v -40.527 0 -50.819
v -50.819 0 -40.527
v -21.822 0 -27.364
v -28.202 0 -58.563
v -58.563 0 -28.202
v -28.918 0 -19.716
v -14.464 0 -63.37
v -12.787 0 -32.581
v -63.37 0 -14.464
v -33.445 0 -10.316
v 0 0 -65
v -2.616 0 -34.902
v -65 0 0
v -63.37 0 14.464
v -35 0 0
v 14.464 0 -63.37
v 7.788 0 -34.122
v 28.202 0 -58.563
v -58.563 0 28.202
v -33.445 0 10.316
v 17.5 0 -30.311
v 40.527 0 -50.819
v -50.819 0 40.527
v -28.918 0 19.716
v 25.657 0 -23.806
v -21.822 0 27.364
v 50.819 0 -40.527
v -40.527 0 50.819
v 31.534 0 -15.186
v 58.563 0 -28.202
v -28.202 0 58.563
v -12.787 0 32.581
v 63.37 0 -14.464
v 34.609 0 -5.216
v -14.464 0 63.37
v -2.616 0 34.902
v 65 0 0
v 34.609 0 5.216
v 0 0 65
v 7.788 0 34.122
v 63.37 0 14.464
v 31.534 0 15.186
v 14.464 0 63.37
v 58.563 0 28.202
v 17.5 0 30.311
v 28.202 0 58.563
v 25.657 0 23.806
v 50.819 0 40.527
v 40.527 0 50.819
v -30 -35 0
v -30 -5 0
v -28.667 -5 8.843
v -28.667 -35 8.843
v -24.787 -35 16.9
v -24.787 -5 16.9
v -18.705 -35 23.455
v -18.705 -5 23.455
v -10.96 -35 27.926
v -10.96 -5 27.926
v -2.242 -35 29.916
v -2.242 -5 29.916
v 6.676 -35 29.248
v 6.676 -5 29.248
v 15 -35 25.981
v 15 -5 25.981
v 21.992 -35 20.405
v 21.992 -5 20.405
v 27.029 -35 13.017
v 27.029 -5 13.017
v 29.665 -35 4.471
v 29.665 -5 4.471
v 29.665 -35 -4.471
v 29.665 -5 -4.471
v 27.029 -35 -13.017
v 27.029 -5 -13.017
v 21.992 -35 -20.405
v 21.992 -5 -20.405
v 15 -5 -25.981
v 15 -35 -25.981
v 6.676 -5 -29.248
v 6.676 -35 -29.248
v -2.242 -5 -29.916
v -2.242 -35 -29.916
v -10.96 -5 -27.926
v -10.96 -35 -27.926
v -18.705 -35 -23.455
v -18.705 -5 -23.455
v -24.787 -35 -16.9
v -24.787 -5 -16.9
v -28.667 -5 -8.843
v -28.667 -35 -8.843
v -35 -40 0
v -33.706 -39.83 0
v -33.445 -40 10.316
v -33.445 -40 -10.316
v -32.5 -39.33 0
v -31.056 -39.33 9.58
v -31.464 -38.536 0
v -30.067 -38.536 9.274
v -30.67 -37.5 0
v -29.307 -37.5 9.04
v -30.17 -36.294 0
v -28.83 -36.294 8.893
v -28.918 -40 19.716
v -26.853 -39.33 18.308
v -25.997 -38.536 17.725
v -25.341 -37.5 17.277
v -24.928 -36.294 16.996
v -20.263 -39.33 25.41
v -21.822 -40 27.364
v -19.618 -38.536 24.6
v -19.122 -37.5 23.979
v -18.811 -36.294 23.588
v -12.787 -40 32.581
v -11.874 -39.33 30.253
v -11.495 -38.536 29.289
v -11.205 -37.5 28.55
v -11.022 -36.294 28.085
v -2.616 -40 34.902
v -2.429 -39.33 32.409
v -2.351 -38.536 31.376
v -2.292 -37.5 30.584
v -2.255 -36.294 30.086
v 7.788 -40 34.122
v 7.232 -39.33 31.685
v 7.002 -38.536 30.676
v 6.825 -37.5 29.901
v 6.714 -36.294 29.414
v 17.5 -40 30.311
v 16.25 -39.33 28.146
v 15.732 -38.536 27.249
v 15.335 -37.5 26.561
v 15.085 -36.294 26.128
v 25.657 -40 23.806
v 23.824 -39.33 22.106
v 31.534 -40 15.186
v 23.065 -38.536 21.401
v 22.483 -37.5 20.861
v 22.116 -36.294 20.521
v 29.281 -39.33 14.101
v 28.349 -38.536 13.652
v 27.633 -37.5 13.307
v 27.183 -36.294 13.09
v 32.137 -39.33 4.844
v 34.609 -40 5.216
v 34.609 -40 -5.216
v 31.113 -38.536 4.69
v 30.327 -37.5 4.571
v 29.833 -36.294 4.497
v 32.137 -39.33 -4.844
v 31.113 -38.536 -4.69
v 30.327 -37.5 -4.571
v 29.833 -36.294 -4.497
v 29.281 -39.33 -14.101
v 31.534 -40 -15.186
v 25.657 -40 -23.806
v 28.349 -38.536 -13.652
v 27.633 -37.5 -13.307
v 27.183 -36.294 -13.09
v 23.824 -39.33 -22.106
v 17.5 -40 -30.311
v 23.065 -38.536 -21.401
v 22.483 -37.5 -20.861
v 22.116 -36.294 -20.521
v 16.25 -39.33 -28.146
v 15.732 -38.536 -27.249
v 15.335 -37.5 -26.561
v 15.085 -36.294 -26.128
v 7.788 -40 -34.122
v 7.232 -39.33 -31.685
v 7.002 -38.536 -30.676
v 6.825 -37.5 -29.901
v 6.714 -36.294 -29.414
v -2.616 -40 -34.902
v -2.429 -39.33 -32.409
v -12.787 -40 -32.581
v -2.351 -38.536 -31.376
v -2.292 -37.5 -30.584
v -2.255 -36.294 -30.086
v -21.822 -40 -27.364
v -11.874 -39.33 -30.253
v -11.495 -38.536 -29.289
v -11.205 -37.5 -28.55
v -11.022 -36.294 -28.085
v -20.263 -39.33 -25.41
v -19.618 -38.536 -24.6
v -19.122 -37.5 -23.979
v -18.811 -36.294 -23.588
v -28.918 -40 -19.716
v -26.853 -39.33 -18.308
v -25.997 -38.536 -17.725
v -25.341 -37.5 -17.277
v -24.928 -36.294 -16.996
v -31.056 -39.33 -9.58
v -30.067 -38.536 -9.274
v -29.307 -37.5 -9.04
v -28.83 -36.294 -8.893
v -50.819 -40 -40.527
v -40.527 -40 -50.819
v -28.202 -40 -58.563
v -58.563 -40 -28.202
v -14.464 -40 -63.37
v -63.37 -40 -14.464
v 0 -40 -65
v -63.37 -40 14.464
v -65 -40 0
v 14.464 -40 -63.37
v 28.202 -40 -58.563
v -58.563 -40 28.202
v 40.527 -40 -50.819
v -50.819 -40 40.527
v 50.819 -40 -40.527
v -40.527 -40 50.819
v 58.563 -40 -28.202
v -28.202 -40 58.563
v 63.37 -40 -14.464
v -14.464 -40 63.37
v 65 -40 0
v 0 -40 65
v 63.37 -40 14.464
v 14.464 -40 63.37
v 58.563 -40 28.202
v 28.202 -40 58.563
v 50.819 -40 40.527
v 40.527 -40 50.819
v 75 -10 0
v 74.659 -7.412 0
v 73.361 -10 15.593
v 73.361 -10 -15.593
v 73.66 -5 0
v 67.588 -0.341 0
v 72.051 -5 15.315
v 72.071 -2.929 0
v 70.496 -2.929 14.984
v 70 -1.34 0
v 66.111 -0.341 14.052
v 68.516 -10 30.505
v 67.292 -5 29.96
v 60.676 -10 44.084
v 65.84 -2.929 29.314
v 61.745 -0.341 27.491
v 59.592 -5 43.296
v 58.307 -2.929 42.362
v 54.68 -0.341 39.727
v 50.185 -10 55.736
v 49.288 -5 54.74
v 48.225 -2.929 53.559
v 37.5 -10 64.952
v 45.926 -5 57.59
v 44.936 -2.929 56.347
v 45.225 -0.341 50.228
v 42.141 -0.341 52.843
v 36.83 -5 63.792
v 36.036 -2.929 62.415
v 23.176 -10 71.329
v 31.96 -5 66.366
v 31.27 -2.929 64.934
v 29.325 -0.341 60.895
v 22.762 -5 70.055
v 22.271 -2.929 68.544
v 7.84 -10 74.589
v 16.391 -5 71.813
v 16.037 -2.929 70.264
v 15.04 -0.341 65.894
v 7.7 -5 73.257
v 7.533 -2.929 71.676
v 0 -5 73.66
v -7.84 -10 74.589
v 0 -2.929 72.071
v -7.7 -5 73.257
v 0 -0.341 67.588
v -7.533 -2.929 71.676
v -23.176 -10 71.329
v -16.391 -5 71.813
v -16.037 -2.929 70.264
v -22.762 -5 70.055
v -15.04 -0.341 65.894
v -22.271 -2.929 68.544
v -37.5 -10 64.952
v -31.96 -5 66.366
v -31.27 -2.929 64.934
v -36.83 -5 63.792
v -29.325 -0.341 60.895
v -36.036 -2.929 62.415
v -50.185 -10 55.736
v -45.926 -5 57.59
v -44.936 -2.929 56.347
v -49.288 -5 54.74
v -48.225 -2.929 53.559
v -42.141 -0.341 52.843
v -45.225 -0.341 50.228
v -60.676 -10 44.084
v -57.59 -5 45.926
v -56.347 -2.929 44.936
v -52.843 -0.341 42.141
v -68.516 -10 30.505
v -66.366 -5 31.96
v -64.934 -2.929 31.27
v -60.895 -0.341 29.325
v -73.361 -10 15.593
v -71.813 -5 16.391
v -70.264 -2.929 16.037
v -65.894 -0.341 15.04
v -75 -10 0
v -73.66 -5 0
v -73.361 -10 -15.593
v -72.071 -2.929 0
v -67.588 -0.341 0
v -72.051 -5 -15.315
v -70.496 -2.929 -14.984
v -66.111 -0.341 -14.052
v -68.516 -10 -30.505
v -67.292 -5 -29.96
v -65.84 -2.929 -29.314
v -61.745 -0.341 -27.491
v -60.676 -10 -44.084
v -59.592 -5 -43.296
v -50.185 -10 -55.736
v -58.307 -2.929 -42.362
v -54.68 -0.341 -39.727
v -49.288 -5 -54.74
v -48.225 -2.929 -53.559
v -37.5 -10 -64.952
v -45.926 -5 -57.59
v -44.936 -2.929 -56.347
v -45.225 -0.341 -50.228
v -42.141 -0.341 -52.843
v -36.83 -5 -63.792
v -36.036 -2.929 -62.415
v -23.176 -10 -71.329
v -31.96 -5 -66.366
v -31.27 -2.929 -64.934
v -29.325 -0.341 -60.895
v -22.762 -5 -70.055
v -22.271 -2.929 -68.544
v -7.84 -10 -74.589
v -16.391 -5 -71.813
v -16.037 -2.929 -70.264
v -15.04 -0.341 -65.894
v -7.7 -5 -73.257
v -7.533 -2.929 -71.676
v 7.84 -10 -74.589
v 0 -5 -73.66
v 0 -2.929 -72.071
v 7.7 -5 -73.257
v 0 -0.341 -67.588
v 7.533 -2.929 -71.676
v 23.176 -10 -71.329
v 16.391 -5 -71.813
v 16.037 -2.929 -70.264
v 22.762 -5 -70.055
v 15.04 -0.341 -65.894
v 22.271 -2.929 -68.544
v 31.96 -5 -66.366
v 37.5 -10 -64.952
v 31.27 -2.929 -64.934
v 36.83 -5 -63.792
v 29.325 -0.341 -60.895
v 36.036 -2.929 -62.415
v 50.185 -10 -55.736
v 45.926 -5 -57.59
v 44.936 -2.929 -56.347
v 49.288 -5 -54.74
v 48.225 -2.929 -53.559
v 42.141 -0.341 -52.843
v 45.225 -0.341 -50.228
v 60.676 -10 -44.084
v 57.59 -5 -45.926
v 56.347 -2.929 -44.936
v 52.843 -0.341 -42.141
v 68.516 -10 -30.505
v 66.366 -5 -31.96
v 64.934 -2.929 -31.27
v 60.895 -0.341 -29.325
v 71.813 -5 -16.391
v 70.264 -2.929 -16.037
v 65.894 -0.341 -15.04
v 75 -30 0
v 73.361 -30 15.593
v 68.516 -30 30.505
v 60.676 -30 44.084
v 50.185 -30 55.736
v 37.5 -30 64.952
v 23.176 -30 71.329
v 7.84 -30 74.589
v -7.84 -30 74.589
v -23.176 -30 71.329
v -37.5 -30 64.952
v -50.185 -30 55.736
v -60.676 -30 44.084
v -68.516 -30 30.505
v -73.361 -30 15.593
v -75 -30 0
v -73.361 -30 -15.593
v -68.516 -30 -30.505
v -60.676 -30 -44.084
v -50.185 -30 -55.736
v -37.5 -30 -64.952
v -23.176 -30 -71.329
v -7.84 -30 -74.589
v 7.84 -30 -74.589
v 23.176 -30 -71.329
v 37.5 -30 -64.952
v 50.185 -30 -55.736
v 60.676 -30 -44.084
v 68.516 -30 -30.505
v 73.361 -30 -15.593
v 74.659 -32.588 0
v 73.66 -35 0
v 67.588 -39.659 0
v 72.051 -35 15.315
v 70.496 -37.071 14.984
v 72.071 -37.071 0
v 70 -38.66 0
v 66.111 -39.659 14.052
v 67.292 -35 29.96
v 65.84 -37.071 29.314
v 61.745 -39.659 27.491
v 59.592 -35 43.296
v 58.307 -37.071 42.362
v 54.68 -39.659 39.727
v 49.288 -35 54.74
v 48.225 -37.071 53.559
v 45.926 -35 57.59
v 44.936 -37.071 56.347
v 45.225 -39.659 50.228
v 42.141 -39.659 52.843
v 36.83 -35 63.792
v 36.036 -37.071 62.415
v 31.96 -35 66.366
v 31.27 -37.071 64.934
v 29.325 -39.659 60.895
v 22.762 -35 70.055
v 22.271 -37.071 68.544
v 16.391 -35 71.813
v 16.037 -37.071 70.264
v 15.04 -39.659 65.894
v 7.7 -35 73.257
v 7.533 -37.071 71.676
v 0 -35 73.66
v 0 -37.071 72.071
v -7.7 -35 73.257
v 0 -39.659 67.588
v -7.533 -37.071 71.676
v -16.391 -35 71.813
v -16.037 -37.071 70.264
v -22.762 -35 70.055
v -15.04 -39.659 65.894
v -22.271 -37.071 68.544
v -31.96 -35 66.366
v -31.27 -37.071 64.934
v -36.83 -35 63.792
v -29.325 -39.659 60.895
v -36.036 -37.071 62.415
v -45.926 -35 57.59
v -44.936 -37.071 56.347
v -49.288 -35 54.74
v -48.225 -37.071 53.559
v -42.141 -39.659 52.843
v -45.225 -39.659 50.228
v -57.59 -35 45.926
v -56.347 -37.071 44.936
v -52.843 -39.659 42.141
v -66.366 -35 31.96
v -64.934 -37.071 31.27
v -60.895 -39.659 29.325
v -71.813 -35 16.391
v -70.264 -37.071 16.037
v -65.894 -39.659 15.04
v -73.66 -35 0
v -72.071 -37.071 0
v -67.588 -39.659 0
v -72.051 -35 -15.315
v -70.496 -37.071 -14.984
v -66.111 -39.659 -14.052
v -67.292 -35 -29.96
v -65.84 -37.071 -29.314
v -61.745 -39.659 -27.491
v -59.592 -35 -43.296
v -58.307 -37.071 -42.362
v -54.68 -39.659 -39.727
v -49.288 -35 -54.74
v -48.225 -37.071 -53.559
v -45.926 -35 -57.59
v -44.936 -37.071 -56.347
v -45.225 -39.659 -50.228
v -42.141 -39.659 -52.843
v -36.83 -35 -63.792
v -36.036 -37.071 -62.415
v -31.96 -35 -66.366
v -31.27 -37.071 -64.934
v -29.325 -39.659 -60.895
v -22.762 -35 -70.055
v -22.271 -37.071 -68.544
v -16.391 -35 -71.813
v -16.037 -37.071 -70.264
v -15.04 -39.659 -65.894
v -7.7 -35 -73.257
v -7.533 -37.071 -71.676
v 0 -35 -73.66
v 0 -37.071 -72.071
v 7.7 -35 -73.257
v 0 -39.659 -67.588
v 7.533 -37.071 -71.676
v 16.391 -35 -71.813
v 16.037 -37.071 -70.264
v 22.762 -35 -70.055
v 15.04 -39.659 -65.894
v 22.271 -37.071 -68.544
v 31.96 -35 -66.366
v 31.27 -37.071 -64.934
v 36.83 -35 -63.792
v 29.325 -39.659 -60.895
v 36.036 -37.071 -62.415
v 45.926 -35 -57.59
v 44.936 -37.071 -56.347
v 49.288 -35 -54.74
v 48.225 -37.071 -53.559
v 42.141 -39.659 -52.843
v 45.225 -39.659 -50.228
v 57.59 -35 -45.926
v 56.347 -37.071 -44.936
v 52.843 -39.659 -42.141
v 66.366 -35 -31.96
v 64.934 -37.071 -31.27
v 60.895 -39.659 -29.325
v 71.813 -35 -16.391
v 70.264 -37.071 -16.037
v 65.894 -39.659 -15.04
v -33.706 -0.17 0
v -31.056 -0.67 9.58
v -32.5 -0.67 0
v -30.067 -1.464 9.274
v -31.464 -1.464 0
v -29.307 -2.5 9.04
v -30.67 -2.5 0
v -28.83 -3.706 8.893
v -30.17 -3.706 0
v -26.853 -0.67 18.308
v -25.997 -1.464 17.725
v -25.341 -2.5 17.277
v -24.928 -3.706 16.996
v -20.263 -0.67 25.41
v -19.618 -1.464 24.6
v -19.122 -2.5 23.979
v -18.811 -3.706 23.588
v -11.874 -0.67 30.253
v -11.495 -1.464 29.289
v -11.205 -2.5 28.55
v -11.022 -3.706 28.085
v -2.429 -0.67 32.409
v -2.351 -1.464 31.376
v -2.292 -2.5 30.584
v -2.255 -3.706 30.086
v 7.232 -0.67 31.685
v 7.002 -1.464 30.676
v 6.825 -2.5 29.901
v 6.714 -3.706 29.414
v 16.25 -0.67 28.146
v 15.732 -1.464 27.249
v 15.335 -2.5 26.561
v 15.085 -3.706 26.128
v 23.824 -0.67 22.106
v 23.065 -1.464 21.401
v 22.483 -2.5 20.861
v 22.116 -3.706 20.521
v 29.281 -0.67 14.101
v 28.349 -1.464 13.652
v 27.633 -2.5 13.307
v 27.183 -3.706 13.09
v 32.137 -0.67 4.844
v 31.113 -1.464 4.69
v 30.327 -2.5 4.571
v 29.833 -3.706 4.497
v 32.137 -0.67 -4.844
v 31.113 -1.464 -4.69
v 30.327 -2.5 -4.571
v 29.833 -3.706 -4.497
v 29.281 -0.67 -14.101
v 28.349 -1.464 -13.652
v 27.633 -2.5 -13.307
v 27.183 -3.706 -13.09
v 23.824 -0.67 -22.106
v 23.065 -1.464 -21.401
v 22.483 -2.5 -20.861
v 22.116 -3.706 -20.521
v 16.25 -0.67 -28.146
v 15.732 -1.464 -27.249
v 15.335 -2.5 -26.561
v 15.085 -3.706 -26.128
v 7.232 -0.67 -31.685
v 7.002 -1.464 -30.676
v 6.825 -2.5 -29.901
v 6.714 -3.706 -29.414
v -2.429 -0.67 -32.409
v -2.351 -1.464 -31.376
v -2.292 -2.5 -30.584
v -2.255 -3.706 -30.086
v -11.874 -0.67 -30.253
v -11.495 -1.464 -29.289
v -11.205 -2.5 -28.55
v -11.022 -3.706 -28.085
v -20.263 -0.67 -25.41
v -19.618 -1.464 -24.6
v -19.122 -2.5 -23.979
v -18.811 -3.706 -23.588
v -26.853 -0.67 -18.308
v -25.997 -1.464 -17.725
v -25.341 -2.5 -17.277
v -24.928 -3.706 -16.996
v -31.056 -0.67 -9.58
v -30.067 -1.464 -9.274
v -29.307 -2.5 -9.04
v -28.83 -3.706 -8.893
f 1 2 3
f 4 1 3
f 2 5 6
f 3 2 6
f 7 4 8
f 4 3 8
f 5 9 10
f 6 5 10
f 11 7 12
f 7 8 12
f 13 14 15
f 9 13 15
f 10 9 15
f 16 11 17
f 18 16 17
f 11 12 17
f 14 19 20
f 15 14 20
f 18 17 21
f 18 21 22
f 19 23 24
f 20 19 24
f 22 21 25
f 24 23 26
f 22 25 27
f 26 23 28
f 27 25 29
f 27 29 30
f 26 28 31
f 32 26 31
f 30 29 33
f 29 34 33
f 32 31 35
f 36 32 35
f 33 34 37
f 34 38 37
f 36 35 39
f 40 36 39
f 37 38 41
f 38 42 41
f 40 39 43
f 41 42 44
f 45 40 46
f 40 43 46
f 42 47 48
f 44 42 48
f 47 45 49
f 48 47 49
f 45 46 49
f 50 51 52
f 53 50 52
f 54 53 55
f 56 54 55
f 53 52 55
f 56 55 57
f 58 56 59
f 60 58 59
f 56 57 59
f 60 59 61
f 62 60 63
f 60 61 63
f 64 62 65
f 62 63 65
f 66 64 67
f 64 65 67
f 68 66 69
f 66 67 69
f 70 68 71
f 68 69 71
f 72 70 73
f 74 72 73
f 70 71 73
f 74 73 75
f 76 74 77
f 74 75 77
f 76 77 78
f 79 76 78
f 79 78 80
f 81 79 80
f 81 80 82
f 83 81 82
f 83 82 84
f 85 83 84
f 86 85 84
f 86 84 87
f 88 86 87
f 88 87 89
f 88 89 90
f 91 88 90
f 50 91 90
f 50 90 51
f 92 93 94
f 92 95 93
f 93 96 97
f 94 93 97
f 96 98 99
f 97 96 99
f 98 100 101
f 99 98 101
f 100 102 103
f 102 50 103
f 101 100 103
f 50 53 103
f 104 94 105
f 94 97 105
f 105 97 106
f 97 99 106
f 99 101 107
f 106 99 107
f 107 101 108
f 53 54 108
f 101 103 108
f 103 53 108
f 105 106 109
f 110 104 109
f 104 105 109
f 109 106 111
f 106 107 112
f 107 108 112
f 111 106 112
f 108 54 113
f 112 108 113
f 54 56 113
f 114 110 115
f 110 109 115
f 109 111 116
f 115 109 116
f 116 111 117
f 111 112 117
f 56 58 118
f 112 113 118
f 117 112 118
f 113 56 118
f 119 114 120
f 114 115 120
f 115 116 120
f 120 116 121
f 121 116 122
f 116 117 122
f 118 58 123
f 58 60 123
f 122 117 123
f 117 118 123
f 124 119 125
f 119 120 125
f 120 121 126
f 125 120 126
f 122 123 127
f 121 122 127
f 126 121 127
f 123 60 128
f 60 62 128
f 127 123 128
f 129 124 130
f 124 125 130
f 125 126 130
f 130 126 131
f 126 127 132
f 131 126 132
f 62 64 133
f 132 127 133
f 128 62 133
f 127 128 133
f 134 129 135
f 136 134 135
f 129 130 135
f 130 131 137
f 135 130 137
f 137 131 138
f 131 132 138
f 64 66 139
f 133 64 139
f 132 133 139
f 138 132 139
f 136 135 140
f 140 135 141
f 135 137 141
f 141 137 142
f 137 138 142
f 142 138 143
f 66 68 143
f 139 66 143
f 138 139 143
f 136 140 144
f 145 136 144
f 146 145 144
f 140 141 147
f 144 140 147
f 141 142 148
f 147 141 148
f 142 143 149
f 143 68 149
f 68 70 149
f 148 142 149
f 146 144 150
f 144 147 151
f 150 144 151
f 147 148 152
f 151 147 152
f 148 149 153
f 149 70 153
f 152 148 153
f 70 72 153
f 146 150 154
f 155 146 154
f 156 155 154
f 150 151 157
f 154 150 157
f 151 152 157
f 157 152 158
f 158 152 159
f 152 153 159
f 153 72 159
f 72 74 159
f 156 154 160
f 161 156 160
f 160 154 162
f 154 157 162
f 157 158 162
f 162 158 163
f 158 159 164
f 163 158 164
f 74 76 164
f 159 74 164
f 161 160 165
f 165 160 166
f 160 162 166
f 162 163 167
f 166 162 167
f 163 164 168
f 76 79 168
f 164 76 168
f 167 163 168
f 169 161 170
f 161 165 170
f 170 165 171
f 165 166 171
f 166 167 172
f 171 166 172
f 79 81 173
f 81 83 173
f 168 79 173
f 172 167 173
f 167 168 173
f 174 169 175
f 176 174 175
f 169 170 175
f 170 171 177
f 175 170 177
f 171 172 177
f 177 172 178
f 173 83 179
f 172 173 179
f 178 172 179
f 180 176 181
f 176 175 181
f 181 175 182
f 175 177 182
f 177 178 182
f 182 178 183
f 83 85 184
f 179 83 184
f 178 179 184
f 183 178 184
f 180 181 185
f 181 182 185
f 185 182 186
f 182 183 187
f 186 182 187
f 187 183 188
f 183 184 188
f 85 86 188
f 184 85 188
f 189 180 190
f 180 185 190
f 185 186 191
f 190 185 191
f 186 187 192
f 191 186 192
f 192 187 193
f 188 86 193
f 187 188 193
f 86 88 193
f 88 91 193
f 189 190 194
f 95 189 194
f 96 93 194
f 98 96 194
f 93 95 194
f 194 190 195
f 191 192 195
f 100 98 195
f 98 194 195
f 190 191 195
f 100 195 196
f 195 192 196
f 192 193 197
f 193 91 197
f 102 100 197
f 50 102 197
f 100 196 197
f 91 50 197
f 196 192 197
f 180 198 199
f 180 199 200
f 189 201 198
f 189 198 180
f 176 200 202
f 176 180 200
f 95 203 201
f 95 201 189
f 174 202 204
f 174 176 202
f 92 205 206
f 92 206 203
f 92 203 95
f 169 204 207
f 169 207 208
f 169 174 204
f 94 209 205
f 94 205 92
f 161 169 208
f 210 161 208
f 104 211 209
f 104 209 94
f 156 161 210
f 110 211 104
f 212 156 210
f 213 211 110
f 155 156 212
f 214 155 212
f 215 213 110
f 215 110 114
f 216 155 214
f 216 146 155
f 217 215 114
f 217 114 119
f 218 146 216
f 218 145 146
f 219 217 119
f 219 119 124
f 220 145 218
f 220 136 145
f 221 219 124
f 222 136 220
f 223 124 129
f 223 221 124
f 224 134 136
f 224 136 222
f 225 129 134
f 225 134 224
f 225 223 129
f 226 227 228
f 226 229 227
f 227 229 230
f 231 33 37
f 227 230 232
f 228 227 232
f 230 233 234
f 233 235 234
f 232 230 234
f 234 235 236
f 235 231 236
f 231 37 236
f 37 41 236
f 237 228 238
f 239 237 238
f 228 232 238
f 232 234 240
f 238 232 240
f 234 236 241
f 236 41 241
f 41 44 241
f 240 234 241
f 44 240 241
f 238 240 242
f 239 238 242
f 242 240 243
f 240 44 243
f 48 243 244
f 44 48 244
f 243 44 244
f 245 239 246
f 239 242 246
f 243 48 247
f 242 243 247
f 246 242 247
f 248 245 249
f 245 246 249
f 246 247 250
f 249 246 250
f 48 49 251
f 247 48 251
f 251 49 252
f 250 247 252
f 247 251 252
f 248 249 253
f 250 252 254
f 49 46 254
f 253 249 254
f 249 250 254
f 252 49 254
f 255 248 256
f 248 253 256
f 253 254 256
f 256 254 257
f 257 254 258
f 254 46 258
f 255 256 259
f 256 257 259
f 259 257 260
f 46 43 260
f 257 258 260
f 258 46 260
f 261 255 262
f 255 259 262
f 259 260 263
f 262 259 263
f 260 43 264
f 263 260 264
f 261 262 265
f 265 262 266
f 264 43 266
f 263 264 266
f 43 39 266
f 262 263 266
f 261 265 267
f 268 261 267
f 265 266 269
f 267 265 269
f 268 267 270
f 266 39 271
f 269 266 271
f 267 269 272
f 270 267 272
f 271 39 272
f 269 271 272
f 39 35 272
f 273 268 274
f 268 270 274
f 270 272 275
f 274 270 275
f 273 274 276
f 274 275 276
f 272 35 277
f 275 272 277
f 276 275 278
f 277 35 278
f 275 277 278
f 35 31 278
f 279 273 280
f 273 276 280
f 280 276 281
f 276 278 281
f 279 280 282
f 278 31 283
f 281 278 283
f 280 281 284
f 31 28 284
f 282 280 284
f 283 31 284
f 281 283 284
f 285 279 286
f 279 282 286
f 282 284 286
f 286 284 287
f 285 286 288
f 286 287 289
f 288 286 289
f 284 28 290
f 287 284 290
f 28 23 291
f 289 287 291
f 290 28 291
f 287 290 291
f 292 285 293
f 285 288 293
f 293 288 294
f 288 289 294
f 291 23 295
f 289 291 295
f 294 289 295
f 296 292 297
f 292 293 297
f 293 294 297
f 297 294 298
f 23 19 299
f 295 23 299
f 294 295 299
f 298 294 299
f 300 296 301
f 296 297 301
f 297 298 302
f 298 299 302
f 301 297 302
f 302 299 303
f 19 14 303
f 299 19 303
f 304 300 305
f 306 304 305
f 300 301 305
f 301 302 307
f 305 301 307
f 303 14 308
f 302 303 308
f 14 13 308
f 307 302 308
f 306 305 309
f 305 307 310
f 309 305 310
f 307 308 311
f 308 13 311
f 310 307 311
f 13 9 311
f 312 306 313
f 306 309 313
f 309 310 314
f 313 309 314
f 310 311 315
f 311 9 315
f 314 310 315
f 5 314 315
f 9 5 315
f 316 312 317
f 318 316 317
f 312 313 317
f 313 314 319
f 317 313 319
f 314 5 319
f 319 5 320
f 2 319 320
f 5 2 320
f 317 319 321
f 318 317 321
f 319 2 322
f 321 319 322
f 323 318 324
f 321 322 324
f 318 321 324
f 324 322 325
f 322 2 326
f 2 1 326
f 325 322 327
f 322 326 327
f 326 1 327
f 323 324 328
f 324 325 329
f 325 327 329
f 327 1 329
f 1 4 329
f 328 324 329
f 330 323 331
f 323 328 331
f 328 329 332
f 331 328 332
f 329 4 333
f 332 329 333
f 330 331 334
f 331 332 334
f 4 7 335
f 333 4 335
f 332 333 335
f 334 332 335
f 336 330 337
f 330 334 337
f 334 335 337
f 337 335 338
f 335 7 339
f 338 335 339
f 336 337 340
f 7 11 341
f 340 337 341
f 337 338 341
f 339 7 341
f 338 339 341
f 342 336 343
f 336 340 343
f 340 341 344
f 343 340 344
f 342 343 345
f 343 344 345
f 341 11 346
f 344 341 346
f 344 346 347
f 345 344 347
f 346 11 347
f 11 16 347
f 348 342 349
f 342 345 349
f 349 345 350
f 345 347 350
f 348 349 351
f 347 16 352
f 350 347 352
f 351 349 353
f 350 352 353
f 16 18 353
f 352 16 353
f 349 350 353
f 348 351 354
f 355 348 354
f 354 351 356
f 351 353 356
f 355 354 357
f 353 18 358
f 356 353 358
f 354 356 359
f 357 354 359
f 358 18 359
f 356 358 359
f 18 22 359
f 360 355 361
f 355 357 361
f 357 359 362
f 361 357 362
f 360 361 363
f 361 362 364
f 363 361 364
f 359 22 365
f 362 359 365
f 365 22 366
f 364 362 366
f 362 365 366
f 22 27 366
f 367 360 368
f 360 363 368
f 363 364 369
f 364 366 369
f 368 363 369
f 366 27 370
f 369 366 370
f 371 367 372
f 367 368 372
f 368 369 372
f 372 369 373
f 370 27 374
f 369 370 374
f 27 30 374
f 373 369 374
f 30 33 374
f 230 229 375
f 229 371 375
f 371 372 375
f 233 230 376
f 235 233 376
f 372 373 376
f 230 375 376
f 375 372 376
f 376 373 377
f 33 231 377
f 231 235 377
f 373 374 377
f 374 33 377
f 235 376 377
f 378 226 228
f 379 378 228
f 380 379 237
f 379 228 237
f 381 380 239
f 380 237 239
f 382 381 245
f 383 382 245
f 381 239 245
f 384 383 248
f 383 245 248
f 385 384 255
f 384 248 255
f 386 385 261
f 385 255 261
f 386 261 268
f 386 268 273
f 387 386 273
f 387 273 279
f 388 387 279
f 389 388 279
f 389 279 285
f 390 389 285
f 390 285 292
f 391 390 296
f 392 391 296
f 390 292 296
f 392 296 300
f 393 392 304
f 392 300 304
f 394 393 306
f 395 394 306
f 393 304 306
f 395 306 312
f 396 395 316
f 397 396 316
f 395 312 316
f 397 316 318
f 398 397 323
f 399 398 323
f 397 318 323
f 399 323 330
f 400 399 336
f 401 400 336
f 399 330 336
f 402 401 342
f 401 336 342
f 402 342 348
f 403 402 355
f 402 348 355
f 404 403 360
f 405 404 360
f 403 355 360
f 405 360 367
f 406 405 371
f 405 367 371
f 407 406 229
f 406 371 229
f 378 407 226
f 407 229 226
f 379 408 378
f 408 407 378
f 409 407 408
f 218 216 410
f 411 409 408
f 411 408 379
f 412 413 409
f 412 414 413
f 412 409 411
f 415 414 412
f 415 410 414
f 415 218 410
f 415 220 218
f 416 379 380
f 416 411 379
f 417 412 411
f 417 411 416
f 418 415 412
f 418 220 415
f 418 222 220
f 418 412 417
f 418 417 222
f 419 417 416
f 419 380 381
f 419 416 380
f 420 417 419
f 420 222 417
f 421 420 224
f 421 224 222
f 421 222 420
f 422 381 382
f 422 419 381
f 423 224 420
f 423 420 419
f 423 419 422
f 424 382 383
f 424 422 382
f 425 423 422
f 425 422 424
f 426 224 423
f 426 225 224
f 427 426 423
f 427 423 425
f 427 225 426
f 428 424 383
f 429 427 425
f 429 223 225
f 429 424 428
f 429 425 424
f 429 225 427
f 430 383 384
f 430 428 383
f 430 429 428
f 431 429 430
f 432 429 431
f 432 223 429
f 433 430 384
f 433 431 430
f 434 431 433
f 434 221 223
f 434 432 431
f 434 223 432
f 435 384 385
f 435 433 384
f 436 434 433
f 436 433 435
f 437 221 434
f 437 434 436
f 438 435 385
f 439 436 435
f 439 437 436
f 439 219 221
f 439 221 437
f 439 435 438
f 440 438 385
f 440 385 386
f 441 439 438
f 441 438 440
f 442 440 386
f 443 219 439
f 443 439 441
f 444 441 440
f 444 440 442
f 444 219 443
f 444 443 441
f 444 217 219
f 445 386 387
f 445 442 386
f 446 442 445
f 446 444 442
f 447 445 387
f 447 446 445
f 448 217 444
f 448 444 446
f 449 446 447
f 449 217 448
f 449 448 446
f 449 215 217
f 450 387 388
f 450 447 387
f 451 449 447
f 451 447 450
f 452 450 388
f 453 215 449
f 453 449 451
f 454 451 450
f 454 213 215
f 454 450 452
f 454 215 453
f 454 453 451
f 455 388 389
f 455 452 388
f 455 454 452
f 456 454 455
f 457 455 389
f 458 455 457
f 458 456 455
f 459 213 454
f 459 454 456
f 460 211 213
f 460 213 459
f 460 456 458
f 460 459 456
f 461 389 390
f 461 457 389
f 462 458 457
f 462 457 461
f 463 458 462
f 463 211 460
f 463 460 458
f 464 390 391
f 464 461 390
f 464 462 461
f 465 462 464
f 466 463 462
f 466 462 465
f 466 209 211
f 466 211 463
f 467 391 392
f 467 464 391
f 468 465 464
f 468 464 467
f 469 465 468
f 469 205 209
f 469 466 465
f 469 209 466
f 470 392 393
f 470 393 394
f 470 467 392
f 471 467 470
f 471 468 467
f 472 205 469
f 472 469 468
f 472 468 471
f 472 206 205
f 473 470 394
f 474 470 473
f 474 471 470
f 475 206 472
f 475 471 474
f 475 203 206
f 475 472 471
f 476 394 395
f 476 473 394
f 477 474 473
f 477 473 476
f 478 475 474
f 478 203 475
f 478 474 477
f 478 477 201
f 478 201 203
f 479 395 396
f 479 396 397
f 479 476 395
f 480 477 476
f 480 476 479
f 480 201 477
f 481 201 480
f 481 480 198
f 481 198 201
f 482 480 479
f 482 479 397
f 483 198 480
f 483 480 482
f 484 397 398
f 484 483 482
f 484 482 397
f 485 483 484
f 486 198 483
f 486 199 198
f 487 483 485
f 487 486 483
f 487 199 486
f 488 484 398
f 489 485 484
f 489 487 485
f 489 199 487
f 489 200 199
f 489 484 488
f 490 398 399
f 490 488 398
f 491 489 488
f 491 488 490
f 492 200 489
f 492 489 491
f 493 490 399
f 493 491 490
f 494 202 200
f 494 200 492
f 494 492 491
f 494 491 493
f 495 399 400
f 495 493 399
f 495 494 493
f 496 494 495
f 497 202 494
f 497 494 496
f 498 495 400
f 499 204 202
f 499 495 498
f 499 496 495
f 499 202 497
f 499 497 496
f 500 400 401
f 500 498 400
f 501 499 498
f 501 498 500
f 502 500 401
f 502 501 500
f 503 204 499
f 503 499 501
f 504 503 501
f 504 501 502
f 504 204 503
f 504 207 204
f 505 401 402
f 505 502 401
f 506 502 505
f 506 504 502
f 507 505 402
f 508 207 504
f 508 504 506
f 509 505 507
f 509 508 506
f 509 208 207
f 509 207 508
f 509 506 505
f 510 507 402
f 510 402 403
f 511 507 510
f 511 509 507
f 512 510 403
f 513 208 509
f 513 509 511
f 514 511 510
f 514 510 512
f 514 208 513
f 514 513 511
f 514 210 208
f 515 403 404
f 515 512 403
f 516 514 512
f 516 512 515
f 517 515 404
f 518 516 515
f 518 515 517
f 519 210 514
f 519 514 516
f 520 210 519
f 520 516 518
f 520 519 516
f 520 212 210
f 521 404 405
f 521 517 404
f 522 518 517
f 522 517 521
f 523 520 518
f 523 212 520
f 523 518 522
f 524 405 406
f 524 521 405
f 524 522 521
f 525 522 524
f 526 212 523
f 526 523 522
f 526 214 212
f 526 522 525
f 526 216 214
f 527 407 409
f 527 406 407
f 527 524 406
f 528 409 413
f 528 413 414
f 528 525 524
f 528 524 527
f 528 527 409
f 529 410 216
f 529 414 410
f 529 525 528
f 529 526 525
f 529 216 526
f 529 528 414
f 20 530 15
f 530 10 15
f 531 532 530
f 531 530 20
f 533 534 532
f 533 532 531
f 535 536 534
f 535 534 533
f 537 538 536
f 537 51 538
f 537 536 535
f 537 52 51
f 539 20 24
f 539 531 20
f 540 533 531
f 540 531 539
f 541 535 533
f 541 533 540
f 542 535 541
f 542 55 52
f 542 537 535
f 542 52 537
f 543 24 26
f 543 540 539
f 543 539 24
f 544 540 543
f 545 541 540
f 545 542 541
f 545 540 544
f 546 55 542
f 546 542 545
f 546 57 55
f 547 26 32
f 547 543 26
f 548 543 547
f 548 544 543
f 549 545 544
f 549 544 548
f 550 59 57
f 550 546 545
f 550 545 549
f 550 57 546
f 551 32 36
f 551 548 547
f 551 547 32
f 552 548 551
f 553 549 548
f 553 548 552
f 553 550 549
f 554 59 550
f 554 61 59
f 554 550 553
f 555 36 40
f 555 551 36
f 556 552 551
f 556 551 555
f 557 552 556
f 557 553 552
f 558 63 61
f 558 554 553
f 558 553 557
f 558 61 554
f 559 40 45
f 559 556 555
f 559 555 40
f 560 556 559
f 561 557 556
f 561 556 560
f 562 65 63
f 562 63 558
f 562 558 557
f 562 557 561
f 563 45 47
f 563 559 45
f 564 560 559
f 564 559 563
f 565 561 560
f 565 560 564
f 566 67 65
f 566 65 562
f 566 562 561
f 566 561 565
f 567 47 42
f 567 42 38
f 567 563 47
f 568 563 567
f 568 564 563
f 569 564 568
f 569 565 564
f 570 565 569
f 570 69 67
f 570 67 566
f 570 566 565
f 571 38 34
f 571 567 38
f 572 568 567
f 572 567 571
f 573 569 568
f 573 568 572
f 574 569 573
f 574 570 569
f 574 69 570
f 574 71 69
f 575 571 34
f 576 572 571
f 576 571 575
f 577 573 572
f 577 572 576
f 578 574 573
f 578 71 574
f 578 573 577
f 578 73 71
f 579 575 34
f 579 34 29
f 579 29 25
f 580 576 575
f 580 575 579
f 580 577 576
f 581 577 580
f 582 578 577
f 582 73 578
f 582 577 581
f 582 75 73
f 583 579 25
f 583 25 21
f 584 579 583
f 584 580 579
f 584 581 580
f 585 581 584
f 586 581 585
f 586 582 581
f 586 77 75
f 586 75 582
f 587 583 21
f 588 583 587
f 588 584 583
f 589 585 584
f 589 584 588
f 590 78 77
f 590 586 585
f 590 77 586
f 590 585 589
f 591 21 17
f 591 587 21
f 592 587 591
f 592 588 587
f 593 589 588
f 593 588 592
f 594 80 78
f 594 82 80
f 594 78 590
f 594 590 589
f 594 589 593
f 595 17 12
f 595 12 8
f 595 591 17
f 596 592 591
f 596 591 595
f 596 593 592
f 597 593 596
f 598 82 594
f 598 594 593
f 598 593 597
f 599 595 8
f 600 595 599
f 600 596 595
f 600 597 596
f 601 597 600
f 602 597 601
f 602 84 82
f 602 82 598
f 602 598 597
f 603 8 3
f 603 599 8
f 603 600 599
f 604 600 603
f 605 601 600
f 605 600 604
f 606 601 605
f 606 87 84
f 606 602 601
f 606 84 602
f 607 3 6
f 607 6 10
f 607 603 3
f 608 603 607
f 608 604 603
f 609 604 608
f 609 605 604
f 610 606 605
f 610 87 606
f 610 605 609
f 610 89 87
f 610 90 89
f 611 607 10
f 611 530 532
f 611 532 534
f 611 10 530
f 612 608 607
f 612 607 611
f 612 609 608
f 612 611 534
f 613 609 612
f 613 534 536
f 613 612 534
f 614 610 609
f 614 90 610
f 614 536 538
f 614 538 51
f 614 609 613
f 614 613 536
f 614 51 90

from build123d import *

# Parameters (mm, degrees)
F0_R     = 75
F1_DEPTH = 40
F2_R     = 10
F3_R     = 10
F4_R     = 30
F5_DEPTH = 45
F6_R     = 5


with BuildPart() as f1:
    # F0 (on Front) → F1 (new body)
    with BuildSketch(Plane.XZ):
        Circle(F0_R)
    extrude(amount=F1_DEPTH)

    # F2
    f2_edges = [f1.edges().sort_by_distance(p)[0] for p in [
        (-75, -40, 0),
    ]]
    fillet(f2_edges, radius=F2_R)

    # F3
    f3_edges = [f1.edges().sort_by_distance(p)[0] for p in [
        (-75, 0, 0),
    ]]
    fillet(f3_edges, radius=F3_R)

    # F4 (on face) → F5 (cut)
    with BuildSketch(Plane(origin=(0, 0, 0), x_dir=(-1, 0, 0), z_dir=(0, 1, 0))):
        Circle(F4_R)
    extrude(amount=-F5_DEPTH, mode=Mode.SUBTRACT)

    # F6
    f6_edges = [f1.edges().sort_by_distance(p)[0] for p in [
        (30, -40, 0),
        (30, 0, 0),
    ]]
    fillet(f6_edges, radius=F6_R)


solid = f1.part
